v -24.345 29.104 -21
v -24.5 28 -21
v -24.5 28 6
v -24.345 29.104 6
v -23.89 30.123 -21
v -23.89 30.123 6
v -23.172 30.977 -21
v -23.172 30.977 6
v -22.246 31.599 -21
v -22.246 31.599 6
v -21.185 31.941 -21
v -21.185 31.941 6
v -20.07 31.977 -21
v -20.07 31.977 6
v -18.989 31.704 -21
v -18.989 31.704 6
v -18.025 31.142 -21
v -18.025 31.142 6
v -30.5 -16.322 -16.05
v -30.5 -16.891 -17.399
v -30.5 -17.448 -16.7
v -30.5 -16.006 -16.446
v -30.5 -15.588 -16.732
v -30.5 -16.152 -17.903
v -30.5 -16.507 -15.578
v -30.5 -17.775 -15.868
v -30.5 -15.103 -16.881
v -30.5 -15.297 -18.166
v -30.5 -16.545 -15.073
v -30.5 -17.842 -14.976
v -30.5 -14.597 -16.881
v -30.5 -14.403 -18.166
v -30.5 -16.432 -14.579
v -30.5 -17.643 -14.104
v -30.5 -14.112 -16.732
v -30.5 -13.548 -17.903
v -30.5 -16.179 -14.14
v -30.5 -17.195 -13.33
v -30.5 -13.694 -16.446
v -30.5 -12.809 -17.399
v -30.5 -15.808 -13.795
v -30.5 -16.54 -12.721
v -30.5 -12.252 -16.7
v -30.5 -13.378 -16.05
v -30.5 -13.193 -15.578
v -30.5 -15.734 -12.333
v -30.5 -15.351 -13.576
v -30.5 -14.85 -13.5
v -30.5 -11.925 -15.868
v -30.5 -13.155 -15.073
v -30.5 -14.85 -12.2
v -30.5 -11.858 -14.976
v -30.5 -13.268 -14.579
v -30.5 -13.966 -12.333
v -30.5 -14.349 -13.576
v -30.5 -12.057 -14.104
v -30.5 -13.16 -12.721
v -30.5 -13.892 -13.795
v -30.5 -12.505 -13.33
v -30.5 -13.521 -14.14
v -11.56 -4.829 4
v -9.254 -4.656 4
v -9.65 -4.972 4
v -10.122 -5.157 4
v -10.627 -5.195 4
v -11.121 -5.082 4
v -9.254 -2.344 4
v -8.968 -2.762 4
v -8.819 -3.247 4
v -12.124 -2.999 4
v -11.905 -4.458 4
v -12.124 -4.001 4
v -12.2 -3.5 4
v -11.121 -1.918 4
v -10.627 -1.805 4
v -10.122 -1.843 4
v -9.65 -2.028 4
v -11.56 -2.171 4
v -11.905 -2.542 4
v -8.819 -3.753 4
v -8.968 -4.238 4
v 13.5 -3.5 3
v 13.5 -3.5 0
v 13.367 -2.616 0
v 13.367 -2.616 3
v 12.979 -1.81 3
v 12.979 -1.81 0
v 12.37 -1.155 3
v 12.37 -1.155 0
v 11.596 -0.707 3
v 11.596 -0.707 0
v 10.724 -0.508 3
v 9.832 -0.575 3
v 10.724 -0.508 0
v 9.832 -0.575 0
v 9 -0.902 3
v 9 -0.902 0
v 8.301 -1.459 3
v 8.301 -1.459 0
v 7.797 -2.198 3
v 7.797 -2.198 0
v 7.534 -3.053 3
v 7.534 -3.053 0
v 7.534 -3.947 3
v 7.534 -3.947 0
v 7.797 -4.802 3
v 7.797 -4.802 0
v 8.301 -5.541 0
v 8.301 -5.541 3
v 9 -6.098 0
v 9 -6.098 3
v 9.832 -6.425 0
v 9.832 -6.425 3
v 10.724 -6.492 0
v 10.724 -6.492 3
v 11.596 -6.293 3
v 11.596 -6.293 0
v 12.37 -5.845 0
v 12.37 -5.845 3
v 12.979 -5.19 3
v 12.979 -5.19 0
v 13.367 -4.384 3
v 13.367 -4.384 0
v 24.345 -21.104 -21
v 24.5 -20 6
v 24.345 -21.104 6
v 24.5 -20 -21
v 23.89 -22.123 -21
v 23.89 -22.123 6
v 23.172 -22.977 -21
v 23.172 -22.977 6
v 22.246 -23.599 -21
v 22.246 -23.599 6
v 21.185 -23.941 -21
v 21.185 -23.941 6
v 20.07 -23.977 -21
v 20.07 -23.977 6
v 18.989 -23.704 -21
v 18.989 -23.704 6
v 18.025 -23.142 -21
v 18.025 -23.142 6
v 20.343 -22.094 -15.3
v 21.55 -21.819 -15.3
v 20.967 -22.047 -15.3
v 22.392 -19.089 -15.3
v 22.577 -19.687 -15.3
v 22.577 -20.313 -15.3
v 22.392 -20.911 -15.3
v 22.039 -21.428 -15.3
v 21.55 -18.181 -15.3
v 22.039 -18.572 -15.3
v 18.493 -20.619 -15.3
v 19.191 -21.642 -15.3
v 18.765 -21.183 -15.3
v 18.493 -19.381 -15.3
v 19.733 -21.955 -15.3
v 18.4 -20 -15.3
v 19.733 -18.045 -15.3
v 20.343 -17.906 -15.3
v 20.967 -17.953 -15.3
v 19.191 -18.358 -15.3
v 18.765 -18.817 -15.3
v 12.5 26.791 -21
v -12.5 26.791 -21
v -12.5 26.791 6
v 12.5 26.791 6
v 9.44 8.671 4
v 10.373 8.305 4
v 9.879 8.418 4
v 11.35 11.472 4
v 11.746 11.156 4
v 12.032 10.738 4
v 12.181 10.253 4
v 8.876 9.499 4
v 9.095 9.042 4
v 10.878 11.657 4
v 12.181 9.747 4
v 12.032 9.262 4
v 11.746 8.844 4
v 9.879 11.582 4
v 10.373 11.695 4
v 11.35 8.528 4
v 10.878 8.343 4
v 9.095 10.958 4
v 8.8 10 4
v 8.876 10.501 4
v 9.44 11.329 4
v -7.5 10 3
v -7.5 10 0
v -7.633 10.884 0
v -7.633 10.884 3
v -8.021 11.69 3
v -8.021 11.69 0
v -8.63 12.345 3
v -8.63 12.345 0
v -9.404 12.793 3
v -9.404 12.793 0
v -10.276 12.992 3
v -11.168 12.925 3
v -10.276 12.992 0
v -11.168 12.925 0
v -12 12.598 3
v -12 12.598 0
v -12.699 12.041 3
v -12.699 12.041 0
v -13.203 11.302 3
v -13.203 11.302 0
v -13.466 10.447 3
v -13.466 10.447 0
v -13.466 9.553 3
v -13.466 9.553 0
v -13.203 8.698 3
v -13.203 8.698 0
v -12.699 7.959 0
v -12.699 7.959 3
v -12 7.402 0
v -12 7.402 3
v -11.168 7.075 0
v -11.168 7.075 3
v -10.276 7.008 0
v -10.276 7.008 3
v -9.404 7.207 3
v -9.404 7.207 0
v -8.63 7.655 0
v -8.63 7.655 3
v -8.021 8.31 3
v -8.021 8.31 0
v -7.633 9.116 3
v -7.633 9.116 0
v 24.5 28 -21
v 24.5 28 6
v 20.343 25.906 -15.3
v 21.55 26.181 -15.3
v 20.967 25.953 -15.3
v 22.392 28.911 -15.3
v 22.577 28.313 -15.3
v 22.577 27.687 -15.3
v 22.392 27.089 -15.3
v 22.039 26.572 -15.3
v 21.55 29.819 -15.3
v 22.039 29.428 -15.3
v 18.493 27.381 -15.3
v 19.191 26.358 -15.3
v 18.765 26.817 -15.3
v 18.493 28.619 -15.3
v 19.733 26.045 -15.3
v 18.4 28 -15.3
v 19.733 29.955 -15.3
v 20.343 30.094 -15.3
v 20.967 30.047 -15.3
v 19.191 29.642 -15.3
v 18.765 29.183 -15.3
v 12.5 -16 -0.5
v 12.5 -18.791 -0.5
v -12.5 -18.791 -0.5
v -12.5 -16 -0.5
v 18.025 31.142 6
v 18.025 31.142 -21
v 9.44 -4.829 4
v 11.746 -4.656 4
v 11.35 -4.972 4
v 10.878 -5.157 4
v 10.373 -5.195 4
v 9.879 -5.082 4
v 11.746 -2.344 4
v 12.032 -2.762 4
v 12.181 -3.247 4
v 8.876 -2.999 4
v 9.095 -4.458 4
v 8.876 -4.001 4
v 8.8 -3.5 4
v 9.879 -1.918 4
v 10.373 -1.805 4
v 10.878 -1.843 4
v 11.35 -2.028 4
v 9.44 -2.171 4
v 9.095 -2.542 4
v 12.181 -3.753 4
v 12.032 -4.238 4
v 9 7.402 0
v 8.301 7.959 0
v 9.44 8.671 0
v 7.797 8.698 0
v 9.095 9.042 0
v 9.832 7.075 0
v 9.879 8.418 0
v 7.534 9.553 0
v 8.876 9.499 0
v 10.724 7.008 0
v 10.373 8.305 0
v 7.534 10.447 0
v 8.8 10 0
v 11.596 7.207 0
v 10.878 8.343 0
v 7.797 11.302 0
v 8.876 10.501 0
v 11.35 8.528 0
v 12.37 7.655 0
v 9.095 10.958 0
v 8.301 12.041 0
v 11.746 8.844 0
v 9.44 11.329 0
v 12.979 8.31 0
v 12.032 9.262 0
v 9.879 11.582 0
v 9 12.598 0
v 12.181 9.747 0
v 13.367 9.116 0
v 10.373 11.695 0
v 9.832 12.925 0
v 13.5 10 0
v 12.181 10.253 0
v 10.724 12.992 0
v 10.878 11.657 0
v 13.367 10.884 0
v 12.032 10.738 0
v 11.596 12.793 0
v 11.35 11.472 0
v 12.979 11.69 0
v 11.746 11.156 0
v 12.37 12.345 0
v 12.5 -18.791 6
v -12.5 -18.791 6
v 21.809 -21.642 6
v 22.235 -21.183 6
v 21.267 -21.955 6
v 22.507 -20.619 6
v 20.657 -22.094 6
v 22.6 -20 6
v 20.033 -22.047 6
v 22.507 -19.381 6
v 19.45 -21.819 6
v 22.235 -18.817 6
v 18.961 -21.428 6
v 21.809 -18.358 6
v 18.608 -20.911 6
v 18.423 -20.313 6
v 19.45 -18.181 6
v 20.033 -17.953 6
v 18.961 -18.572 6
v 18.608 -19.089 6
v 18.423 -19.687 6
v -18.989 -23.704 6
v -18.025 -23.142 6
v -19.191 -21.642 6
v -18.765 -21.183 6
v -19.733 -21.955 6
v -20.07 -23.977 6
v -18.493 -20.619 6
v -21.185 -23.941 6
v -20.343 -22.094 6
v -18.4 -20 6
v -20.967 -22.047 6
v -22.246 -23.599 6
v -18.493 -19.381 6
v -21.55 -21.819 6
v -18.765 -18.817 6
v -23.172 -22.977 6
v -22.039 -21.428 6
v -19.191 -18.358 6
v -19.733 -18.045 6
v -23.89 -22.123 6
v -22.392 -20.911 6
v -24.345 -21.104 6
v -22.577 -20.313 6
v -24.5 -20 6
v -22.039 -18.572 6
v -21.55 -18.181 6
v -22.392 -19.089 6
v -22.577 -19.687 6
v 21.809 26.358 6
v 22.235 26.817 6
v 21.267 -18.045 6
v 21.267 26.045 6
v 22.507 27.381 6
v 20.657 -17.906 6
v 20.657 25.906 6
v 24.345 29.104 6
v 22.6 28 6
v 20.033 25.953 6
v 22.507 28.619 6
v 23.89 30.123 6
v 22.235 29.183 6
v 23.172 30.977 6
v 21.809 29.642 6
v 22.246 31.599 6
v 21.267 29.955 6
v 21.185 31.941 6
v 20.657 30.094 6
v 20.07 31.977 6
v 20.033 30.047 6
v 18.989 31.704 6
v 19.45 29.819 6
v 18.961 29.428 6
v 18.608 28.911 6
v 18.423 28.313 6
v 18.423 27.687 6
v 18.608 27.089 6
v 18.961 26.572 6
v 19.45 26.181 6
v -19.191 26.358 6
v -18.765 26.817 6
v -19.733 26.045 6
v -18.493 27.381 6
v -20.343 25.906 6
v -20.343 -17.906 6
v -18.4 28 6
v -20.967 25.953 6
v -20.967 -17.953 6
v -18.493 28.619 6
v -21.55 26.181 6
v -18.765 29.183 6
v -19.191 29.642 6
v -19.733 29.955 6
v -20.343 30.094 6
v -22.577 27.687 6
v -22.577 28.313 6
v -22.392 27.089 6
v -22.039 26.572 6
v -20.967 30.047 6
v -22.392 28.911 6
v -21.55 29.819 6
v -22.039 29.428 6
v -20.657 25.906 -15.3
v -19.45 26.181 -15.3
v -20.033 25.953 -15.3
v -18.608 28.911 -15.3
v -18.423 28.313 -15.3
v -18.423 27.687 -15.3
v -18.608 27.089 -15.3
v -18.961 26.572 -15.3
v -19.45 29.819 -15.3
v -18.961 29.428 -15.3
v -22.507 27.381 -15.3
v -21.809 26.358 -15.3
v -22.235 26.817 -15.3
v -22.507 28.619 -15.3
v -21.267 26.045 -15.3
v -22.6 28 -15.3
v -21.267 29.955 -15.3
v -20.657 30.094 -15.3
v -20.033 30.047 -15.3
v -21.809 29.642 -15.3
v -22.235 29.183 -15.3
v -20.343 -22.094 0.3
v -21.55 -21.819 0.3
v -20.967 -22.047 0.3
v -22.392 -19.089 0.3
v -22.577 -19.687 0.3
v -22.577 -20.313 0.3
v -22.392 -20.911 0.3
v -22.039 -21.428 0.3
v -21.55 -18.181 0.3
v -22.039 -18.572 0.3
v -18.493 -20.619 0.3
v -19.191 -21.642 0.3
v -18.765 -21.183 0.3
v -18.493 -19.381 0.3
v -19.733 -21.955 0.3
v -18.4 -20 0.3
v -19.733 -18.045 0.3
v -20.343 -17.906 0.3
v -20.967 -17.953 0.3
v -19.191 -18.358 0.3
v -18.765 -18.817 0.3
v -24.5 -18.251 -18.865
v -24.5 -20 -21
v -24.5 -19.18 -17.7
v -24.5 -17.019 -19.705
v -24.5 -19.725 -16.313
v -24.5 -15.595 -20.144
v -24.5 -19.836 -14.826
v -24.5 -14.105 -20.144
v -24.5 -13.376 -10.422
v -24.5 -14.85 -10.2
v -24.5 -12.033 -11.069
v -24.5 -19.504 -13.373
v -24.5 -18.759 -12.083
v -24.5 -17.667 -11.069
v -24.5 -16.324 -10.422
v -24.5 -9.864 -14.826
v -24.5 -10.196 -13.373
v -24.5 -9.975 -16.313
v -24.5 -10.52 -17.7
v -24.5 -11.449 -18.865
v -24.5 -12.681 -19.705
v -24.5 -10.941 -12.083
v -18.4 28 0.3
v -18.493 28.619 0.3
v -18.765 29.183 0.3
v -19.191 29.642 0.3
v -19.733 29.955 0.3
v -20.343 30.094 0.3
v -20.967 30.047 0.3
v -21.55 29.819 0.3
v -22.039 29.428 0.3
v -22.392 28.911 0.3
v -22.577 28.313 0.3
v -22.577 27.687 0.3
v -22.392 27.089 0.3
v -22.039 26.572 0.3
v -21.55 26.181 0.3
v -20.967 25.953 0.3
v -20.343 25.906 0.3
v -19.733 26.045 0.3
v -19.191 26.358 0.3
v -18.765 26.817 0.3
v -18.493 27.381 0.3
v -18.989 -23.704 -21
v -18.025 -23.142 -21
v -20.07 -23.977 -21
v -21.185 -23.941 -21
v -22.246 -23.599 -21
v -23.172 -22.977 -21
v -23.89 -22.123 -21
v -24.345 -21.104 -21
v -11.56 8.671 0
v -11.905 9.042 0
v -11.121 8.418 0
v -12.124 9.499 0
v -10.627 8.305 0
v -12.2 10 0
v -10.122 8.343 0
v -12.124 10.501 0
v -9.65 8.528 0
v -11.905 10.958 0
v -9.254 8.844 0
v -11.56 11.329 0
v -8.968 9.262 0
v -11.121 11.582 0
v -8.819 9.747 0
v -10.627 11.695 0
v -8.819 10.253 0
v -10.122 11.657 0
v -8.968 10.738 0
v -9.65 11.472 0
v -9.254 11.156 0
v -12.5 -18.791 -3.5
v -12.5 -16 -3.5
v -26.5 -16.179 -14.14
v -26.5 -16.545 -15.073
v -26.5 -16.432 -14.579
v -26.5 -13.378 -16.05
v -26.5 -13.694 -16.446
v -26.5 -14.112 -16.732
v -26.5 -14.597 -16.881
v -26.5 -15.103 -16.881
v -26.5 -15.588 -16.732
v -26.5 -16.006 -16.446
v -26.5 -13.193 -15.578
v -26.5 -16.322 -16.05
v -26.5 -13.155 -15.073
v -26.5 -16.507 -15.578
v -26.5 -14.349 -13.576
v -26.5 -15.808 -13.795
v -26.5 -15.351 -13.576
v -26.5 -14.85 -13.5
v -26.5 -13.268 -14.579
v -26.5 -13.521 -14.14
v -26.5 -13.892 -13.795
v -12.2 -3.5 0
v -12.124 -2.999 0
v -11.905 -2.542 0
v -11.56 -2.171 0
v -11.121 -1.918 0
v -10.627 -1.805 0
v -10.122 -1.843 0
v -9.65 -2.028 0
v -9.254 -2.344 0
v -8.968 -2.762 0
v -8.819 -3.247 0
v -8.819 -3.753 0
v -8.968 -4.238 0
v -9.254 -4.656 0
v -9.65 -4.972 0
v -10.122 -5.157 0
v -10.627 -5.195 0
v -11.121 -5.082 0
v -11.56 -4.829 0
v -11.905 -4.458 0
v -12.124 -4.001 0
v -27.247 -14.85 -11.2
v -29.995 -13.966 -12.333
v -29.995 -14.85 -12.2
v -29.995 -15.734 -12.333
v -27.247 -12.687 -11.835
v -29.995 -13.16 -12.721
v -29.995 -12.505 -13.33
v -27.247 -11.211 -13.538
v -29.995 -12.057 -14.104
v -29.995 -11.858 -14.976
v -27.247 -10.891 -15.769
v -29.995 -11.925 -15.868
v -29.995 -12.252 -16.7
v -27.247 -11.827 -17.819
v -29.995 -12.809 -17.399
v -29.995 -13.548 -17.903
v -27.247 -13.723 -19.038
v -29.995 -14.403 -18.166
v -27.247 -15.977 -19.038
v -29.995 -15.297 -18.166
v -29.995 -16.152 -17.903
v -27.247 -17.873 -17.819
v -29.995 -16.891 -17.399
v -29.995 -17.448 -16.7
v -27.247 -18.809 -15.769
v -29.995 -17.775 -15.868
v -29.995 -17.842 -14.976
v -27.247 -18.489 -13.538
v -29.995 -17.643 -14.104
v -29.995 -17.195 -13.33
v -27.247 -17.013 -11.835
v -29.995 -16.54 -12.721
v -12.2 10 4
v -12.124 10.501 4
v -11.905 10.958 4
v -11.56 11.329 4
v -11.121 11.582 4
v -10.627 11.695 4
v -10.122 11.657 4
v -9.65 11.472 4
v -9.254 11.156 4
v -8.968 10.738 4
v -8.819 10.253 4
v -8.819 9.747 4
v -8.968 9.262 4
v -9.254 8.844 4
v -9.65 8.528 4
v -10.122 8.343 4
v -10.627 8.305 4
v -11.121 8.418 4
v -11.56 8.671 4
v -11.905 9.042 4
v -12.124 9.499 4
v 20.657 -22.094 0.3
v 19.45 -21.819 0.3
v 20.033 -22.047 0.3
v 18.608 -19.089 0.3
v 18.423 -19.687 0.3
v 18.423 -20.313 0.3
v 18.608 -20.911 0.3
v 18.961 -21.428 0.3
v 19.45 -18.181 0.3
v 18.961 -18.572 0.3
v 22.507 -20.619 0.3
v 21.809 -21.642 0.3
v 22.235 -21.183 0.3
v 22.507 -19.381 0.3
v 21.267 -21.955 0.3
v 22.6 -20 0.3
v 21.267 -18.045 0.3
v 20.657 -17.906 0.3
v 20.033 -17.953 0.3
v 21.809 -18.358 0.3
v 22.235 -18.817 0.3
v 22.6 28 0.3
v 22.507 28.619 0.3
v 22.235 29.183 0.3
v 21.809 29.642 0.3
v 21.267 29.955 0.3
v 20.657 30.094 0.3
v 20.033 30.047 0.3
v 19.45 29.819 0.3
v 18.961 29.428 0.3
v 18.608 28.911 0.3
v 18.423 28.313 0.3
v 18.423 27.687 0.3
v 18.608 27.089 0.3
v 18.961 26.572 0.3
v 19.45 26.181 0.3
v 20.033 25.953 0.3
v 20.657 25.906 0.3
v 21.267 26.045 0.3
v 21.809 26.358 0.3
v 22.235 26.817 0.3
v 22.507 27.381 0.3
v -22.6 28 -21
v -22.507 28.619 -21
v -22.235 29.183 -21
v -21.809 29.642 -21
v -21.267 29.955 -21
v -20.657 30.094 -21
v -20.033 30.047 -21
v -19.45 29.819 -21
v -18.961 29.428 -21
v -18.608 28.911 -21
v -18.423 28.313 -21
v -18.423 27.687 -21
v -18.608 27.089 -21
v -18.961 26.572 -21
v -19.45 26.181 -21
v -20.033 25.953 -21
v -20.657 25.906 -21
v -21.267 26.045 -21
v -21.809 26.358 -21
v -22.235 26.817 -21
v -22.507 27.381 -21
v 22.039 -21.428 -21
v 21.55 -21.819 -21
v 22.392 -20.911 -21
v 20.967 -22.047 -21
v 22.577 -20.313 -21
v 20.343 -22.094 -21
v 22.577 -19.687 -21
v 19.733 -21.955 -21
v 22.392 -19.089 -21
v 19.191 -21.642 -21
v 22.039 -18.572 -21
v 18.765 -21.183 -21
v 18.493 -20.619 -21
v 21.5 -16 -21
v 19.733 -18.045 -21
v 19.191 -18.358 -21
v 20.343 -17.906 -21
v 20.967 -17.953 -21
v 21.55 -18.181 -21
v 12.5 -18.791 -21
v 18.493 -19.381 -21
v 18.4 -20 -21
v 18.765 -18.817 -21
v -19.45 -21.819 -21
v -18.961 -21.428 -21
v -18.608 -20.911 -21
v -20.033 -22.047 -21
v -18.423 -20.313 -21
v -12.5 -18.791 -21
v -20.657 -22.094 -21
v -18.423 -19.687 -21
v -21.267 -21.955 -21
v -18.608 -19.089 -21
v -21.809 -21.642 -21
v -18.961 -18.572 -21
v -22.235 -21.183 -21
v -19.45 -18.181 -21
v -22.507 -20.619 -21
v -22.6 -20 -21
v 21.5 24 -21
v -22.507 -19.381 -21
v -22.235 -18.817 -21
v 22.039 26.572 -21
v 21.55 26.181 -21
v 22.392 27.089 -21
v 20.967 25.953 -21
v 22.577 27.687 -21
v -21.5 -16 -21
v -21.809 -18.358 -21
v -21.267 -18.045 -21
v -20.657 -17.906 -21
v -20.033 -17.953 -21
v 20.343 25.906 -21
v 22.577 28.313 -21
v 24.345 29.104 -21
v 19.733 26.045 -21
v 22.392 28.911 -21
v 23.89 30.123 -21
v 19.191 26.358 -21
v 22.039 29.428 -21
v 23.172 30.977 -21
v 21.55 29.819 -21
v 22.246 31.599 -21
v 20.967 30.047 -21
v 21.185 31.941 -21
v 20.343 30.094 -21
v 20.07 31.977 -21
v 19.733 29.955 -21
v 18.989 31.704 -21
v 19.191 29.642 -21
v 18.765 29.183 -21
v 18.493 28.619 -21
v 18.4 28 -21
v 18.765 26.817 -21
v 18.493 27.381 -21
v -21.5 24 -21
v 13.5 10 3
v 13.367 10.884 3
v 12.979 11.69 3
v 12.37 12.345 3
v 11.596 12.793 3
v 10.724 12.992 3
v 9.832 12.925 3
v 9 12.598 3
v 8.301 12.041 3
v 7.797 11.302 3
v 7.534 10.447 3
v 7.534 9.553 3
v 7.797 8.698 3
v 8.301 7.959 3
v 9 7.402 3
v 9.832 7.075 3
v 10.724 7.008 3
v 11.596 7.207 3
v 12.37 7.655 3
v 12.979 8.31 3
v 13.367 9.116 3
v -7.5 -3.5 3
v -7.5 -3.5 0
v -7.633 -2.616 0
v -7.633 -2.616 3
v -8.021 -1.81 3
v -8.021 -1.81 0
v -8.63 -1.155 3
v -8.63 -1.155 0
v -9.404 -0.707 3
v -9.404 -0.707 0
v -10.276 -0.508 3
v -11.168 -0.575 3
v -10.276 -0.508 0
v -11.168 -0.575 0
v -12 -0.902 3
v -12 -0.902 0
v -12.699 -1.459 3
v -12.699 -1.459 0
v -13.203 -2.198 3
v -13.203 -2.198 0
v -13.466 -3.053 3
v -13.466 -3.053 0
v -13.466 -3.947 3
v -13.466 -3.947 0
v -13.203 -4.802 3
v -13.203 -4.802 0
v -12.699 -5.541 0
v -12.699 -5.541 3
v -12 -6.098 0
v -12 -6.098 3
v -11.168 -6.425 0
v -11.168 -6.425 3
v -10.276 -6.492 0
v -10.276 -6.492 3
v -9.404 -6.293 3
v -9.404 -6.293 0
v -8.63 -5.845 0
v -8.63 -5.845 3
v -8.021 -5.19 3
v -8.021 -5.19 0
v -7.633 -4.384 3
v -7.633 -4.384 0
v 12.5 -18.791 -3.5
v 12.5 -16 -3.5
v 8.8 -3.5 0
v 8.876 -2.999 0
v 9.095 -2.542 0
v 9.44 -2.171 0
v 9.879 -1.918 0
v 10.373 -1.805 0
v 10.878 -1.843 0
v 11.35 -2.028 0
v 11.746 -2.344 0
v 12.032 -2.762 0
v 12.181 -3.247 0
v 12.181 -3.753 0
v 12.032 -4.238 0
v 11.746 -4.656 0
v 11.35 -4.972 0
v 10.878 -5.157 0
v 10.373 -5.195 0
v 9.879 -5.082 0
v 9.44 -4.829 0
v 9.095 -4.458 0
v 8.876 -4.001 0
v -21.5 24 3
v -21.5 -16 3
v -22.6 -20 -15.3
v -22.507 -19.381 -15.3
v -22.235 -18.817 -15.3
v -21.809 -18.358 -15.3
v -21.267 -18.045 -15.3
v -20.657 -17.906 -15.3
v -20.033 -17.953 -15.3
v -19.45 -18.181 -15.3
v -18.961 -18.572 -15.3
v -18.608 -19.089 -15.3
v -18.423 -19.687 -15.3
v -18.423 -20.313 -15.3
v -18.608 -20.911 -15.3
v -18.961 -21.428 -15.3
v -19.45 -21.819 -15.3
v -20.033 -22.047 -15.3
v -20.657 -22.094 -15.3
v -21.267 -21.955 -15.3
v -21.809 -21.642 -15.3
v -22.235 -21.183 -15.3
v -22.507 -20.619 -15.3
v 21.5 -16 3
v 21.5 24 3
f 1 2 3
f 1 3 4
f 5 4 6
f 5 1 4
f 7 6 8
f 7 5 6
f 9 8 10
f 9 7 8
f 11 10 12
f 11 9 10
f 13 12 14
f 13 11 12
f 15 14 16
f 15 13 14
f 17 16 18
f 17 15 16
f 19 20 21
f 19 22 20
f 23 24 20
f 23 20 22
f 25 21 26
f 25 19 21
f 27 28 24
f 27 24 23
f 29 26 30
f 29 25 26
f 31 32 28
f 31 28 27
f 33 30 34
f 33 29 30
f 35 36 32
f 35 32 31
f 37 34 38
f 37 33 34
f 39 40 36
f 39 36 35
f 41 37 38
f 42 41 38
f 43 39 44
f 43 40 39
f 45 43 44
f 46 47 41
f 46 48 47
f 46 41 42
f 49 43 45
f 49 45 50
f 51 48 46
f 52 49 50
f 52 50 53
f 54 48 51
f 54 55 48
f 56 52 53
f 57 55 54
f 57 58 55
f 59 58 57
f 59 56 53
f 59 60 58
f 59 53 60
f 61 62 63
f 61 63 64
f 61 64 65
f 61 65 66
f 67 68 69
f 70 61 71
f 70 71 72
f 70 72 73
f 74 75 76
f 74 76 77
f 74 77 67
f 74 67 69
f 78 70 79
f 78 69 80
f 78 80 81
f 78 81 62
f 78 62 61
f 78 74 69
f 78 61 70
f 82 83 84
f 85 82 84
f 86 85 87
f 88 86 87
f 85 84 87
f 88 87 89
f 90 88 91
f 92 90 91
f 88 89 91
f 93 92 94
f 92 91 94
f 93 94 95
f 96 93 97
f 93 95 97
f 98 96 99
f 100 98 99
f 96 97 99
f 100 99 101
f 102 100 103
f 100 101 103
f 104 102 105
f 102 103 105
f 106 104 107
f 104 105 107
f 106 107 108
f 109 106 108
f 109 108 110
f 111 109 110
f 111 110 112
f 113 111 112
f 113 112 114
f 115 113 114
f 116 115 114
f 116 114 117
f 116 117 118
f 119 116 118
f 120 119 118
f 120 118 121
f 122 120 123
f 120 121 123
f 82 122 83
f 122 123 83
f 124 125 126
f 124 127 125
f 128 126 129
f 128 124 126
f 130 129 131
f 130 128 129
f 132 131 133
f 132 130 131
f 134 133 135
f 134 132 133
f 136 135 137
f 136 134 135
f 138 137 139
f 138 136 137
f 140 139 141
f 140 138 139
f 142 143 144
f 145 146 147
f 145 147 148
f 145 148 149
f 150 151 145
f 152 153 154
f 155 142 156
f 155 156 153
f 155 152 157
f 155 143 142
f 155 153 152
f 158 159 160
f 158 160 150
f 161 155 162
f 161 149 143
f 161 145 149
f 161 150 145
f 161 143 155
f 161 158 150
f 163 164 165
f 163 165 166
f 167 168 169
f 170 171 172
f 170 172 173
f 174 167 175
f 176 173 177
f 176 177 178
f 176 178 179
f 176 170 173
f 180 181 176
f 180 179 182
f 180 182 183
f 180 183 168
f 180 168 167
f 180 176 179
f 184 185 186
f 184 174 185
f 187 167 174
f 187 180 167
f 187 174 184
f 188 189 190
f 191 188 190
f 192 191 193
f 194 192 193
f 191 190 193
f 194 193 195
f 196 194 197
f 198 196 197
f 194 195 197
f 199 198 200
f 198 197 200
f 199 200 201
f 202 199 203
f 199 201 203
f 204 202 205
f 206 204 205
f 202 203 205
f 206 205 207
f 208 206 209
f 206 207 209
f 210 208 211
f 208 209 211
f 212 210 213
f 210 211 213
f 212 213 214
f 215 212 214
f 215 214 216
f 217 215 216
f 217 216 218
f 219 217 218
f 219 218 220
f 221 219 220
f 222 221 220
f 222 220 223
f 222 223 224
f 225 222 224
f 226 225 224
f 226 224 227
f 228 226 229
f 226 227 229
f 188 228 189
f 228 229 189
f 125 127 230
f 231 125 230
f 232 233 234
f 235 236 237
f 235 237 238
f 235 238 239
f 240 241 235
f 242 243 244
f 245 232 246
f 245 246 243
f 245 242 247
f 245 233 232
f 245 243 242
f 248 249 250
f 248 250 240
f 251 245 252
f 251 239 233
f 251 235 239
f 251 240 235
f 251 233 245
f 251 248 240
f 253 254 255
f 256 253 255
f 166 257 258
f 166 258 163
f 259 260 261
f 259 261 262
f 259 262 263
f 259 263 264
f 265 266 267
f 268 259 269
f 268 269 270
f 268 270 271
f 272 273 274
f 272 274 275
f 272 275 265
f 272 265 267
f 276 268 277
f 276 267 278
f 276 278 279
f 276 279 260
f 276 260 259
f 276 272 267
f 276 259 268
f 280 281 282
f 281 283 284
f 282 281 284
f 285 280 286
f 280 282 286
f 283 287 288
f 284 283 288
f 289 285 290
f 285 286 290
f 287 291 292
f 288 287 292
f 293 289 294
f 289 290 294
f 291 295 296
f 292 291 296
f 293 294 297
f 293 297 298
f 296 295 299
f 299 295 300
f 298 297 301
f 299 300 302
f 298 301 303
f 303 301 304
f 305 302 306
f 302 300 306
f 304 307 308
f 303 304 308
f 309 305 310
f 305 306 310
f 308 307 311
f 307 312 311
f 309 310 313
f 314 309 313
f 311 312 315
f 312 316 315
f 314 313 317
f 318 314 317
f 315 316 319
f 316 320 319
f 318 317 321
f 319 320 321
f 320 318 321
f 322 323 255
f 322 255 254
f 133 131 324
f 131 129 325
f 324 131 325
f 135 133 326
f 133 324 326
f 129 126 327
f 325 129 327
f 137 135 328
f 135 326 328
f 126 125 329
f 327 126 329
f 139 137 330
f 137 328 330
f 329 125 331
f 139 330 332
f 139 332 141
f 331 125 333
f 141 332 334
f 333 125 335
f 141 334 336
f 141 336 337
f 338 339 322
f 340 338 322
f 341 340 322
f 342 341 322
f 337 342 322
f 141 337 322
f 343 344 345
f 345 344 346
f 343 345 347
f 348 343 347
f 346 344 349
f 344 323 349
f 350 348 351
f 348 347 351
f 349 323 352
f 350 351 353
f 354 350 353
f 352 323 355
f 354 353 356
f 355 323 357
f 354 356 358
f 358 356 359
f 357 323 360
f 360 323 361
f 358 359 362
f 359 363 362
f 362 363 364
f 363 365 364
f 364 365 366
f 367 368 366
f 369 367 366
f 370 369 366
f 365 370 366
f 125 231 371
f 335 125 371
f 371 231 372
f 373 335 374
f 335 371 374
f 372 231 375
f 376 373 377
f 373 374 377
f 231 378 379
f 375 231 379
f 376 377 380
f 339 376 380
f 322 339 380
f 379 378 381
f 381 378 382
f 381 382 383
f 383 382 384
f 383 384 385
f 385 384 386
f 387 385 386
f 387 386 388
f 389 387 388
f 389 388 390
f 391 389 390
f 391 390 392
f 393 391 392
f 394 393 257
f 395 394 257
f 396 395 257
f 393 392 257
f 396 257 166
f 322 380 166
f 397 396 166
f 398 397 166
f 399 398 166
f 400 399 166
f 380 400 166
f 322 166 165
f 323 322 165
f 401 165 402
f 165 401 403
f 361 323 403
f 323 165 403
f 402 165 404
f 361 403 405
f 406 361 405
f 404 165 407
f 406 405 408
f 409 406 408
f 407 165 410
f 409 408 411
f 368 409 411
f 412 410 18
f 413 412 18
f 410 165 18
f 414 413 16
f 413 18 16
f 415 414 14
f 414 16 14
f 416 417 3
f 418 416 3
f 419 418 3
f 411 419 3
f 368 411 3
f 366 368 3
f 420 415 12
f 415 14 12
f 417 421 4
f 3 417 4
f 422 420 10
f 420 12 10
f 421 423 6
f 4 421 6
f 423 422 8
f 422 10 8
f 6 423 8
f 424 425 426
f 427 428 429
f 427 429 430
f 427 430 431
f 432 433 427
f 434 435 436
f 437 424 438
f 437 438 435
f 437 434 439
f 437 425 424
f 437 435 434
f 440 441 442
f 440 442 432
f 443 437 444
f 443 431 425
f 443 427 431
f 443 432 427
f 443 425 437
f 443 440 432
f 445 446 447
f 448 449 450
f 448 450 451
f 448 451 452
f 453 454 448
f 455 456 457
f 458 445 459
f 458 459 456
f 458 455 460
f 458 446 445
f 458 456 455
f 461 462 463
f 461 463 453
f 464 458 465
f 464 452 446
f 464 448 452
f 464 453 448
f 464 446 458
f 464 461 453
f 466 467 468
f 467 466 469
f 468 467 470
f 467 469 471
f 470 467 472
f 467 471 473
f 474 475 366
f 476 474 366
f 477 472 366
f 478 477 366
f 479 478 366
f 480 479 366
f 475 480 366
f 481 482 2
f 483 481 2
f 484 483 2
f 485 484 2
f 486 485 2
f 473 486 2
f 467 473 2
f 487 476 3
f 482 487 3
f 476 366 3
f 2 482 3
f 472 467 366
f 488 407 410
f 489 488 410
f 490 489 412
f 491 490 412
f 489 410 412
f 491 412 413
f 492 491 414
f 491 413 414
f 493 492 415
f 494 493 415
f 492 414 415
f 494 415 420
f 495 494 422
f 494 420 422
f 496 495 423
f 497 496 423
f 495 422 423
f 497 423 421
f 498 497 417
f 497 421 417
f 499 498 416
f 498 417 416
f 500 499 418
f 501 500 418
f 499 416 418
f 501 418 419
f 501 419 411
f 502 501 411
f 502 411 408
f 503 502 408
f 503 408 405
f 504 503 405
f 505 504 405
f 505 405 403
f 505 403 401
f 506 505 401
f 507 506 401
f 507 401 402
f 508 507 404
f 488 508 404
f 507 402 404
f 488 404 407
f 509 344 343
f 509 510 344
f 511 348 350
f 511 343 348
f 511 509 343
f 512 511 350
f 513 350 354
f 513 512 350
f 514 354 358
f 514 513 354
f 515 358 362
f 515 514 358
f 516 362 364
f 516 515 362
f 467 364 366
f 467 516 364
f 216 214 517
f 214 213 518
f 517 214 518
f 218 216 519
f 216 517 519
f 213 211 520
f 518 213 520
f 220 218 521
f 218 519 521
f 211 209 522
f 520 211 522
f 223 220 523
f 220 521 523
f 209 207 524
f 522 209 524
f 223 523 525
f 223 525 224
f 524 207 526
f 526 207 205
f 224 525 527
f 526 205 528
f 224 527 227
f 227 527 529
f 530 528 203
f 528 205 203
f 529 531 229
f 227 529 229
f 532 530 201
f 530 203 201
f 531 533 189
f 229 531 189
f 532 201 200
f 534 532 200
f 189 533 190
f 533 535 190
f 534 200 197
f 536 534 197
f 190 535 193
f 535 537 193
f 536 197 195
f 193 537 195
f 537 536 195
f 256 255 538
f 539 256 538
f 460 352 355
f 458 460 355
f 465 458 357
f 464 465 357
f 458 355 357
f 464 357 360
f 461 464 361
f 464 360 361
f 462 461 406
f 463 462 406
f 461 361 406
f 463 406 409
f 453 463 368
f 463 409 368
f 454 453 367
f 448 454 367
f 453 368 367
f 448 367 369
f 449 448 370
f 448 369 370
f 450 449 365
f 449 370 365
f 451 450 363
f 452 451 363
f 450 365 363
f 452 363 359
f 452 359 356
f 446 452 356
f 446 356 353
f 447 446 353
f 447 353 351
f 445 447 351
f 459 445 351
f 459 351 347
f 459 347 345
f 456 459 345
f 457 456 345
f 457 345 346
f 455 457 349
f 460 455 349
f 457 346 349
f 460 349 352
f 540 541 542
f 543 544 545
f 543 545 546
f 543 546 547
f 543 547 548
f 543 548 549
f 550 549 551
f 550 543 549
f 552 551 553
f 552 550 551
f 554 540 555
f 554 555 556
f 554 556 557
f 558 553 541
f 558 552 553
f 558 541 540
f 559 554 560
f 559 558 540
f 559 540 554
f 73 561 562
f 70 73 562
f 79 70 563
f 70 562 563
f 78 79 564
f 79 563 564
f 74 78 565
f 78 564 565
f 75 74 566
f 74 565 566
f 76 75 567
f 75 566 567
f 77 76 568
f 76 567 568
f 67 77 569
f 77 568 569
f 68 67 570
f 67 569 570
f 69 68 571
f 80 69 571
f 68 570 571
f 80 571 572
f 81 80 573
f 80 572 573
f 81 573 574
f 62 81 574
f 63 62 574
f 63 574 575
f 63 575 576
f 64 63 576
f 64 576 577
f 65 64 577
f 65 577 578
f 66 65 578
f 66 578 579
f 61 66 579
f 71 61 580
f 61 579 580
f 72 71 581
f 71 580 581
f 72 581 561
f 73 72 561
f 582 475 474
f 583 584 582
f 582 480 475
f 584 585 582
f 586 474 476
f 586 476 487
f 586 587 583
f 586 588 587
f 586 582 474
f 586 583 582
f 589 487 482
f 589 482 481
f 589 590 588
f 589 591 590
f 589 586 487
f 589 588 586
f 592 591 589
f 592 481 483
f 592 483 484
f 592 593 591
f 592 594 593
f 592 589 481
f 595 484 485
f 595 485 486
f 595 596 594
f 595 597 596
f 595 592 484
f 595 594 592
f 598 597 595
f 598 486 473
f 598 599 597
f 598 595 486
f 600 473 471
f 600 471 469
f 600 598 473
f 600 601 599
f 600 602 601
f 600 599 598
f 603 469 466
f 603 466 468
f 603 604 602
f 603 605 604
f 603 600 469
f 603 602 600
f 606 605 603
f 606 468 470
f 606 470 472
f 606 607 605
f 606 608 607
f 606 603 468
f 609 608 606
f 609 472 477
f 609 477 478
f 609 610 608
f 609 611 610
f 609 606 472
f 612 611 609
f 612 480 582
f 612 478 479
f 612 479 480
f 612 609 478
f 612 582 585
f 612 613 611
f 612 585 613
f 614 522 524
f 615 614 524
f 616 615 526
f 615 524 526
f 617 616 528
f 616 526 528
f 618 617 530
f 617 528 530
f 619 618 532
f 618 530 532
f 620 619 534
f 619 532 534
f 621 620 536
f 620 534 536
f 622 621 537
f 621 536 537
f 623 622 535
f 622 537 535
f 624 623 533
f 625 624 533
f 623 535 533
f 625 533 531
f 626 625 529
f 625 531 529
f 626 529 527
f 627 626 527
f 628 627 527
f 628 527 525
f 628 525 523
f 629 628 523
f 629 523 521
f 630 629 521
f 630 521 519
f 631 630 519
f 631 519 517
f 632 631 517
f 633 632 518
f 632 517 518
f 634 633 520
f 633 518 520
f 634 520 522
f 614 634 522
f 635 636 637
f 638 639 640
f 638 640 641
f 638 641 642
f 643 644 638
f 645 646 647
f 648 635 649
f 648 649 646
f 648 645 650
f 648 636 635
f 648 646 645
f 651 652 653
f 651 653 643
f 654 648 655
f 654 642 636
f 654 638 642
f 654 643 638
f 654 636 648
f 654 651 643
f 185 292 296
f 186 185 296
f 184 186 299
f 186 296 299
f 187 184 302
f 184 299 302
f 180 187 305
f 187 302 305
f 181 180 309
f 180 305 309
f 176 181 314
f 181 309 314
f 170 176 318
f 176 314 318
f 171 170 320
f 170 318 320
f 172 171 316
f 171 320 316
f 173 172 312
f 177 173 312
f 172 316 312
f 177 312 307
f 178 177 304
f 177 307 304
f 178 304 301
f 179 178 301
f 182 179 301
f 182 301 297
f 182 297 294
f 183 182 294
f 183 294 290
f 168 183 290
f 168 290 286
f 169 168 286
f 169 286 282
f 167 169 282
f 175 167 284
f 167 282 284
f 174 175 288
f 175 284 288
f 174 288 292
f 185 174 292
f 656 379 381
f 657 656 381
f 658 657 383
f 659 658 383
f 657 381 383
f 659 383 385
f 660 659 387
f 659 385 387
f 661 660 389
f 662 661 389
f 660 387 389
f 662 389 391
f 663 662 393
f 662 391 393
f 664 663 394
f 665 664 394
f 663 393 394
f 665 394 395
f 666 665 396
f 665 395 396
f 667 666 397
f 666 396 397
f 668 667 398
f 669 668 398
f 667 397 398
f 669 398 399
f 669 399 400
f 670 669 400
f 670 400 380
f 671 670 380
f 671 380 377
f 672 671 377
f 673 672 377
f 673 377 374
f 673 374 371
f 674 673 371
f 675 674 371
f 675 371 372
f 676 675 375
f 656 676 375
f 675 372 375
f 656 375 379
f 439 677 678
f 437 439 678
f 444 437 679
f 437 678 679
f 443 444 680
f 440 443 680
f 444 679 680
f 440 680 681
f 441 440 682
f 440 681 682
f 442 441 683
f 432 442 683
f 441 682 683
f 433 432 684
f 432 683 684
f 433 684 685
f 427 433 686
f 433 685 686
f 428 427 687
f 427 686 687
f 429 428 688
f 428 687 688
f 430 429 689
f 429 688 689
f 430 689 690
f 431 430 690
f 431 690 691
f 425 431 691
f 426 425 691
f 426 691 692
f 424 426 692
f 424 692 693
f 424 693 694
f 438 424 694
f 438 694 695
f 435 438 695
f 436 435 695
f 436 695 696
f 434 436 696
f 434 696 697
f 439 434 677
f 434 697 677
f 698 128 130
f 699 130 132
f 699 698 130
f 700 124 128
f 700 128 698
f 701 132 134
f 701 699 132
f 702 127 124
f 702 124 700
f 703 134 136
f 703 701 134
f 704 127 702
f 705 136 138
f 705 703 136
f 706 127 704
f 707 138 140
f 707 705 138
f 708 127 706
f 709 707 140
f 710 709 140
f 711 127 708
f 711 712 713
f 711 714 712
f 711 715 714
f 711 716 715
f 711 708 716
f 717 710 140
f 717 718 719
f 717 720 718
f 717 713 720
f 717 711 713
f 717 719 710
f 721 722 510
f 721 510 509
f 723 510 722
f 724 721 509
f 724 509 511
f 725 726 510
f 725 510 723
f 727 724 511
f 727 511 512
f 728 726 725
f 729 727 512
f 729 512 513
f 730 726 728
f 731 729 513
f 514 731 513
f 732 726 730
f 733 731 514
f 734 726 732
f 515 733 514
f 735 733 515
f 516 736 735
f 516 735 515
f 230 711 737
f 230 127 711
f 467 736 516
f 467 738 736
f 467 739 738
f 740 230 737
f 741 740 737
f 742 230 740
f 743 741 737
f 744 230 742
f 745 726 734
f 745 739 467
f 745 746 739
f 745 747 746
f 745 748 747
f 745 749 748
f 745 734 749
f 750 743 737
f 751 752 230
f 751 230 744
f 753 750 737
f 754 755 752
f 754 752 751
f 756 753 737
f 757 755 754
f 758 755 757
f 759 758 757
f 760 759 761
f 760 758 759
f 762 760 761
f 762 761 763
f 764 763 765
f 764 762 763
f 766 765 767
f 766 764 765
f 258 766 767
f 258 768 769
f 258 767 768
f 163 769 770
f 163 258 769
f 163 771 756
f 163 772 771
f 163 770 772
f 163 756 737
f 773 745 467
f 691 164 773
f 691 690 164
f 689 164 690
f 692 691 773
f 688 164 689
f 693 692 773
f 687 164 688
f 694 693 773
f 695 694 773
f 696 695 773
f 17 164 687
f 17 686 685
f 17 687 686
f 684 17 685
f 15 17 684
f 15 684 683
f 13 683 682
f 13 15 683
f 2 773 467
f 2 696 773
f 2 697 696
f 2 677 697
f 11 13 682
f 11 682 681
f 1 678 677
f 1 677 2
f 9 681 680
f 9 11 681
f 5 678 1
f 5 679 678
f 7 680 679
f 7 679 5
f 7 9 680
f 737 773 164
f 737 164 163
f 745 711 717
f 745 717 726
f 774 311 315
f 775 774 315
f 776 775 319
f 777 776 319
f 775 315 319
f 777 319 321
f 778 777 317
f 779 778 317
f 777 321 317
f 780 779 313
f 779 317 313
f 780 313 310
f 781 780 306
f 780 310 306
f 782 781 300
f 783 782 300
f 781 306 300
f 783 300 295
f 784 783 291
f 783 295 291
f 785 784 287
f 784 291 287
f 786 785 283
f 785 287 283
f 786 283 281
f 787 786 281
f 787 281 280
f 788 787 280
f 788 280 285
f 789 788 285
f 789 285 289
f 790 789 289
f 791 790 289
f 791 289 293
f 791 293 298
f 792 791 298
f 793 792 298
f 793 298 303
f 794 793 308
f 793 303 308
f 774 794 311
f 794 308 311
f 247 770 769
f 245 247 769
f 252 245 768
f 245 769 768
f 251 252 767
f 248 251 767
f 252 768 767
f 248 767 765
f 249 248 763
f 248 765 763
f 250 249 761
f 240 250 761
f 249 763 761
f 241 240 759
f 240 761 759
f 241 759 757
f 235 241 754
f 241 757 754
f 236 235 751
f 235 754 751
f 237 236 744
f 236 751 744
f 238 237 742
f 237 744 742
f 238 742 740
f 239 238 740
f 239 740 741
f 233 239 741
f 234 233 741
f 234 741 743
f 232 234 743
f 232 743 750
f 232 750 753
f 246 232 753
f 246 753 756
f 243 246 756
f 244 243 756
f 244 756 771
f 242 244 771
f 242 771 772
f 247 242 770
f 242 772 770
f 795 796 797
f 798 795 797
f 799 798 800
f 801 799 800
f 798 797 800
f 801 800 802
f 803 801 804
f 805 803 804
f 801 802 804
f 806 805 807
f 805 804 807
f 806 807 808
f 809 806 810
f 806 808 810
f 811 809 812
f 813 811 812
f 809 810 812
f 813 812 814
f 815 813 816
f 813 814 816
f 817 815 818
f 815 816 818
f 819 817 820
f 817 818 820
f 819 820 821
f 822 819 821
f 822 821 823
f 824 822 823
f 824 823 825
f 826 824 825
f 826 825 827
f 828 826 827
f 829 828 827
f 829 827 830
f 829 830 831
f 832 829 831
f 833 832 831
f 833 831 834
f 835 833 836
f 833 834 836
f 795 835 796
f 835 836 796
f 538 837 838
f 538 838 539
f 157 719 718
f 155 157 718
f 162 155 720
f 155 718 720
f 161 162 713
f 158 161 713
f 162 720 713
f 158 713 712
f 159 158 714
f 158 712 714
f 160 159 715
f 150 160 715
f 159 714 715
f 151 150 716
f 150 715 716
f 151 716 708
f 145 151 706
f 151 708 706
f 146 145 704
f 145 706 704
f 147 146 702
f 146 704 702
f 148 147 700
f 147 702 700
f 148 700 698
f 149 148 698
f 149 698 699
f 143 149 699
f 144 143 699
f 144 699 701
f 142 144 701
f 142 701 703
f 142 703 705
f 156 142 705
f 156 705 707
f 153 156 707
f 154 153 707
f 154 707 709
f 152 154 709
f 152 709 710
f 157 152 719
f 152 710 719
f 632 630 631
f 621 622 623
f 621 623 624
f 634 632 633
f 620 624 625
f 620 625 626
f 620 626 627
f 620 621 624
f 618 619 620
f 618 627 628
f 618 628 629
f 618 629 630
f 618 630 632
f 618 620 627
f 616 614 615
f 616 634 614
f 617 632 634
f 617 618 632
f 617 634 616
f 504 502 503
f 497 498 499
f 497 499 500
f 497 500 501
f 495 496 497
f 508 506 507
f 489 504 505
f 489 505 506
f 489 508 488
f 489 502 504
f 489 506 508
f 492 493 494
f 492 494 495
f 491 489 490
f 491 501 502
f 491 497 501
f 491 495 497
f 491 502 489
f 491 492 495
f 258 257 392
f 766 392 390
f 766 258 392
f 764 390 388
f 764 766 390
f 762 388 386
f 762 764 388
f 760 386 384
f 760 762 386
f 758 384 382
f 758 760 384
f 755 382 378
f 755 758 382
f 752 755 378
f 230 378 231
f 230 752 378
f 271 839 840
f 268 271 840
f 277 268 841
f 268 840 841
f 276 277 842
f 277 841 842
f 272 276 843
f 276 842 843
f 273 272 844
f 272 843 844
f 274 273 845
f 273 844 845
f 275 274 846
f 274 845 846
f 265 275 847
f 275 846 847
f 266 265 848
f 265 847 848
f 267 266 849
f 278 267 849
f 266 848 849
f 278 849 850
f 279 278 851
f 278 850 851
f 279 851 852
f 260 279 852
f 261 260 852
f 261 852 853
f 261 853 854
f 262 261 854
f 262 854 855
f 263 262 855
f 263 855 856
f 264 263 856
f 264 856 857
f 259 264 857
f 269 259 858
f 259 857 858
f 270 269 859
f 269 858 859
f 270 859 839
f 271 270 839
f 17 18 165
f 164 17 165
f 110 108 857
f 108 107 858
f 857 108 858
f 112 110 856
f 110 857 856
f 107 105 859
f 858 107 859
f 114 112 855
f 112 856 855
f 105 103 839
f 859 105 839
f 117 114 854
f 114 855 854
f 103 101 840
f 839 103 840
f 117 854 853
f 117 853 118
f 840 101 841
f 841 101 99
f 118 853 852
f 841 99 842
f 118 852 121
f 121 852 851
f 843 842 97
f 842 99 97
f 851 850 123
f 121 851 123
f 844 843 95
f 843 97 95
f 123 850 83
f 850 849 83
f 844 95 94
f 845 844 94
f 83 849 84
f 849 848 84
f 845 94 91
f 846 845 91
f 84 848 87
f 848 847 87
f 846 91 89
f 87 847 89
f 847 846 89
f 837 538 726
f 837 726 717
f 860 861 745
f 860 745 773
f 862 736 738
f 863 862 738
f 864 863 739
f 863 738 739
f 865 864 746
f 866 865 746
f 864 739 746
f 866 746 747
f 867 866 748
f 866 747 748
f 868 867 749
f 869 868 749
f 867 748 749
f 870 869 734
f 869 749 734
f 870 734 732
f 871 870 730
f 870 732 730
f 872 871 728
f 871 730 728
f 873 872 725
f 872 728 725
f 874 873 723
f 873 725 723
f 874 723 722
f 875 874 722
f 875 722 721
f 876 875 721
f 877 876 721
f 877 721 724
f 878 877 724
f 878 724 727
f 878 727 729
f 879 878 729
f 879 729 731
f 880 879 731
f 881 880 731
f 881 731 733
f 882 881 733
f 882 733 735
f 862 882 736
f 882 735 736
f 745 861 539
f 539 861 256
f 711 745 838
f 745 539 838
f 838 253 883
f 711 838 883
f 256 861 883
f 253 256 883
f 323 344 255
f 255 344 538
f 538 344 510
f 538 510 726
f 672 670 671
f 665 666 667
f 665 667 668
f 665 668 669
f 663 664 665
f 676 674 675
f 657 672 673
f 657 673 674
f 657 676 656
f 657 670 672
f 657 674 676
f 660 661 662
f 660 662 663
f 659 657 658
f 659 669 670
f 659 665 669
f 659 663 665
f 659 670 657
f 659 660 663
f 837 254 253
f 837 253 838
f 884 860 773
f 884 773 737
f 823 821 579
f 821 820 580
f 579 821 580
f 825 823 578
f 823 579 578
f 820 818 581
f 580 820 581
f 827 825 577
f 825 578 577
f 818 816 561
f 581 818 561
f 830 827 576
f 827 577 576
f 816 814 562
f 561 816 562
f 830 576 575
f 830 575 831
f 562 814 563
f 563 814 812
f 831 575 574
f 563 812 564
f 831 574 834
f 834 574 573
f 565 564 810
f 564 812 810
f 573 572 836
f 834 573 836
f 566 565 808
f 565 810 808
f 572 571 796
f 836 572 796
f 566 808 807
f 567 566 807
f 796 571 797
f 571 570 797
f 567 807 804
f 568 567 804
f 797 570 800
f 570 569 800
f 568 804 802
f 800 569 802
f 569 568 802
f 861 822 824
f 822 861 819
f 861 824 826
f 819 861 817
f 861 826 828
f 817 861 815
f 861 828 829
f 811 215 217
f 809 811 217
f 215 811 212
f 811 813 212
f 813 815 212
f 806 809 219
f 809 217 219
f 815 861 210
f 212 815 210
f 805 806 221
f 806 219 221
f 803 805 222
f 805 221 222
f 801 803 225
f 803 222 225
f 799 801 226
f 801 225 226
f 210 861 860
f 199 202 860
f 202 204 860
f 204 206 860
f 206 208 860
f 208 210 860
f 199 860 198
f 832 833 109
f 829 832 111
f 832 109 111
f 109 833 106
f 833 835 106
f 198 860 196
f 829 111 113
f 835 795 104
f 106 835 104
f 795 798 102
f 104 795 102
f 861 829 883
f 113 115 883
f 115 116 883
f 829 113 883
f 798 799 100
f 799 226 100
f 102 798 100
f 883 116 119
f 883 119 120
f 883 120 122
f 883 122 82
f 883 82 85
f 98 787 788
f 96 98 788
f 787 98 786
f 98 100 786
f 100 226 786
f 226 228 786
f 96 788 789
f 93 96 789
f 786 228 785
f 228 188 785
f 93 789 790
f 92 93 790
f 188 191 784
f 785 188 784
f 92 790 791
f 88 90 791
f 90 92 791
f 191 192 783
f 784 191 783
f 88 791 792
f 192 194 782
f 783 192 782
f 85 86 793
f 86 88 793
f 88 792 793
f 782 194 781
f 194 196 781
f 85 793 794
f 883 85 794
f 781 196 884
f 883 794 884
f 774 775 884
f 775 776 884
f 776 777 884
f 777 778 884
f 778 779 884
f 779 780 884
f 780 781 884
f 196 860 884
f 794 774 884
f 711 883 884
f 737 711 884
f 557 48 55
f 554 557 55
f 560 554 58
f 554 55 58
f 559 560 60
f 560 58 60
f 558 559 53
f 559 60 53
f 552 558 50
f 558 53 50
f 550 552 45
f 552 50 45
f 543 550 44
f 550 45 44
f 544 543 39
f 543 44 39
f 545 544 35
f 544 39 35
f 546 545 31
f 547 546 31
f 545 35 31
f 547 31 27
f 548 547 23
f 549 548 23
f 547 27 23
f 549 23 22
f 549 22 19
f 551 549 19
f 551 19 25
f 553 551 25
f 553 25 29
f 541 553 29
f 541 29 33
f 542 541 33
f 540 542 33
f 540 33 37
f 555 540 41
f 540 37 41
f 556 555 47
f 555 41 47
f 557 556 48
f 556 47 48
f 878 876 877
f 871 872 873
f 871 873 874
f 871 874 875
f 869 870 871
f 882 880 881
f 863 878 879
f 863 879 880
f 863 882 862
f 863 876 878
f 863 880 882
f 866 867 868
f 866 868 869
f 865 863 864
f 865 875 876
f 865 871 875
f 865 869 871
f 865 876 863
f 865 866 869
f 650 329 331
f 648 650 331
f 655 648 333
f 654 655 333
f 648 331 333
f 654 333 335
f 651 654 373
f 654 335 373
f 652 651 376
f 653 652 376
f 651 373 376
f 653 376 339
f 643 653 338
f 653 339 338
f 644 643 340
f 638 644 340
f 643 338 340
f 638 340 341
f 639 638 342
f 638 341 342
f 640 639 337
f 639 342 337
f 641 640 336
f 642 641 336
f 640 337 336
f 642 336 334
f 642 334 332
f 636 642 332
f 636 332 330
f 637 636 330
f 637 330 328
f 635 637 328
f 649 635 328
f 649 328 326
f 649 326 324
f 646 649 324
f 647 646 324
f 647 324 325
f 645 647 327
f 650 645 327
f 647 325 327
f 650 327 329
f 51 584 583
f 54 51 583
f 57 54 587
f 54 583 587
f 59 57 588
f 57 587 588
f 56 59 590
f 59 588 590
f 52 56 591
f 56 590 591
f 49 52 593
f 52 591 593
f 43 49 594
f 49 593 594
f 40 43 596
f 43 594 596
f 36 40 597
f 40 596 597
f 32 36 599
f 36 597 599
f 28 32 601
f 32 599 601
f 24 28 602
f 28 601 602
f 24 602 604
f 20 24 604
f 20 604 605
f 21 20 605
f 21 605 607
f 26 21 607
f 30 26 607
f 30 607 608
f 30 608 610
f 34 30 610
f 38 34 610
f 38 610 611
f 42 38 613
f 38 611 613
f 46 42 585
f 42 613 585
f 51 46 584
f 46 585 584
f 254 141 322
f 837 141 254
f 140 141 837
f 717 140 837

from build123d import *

# Parameters (mm, degrees)
SKIZZE1_R                        = 3
AUFSATZ_KAMERA_HALTERUNG_DEPTH   = 3
AUFSATZ_KAMERA_HALTERUNG_2_DEPTH = 3
AUFSATZ_KAMERA_HALTERUNG_3_DEPTH = 3
AUFSATZ_KAMERA_HALTERUNG_4_DEPTH = 3
SKIZZE2_W                        = 43
SKIZZE2_H                        = 40
DECKEL_DEPTH                     = 3
SKIZZE3_R                        = 1.7
L_CHER_KAMERA_HALTERUNG_DEPTH    = 4
SKIZZE4_W                        = 49
SKIZZE4_H                        = 45.581395348
SKIZZE4_W_2                      = 43
SKIZZE4_H_2                      = 40
AUFSATZ_LINEAR_AUSTRAGEN1_DEPTH  = 27
SKIZZE6_W                        = 25
SKIZZE6_H                        = 3
SCHNITT_LINEAR_AUSTRAGEN1_DEPTH  = 2.790698
SKIZZE7_R                        = 4
AUFSATZ_LINEAR_AUSTRAGEN2_DEPTH  = 27
SKIZZE8_R                        = 2.1
SCHNITT_LINEAR_AUSTRAGEN2_DEPTH  = 5.7
SKIZZE9_W                        = 0.18718111
SKIZZE9_H                        = 1.209302326
AUFSATZ_LINEAR_AUSTRAGEN3_DEPTH  = 27
SKIZZE10_R                       = 2.1
SCHNITT_LINEAR_AUSTRAGEN3_DEPTH  = 5.7
SKIZZE11_R                       = 3
AUFSATZ_LINEAR_AUSTRAGEN4_DEPTH  = 6
SKIZZE12_R                       = 1.7
SCHNITT_LINEAR_AUSTRAGEN4_DEPTH  = 4
FASE1_SIZE                       = 2
FASE1_SIZE2                      = 5.494954839


with BuildPart() as part:
    # Skizze1 → Aufsatz Kamera Halterung (new body)
    with BuildSketch(Plane.XY):
        with Locations((10.5, -3.5)):
            Circle(SKIZZE1_R)
    extrude(amount=AUFSATZ_KAMERA_HALTERUNG_DEPTH)



with BuildPart() as body_2:
    # Skizze1 → Aufsatz Kamera Halterung 2 (new body)
    with BuildSketch(Plane.XY):
        with Locations((10.5, 10)):
            Circle(SKIZZE1_R)
    extrude(amount=AUFSATZ_KAMERA_HALTERUNG_2_DEPTH)


with BuildPart() as body_3:
    # Skizze1 → Aufsatz Kamera Halterung 3 (new body)
    with BuildSketch(Plane.XY):
        with Locations((-10.5, 10)):
            Circle(SKIZZE1_R)
    extrude(amount=AUFSATZ_KAMERA_HALTERUNG_3_DEPTH)


with BuildPart() as body_4:
    # Skizze1 → Aufsatz Kamera Halterung 4 (new body)
    with BuildSketch(Plane.XY):
        with Locations((-10.5, -3.5)):
            Circle(SKIZZE1_R)
    extrude(amount=AUFSATZ_KAMERA_HALTERUNG_4_DEPTH)


with BuildPart() as part_1:
    add(part.part)

    add(body_2.part)  # Deckel merges body 2

    add(body_3.part)  # Deckel merges body 3

    add(body_4.part)  # Deckel merges body 4
    # Skizze2 → Deckel (add)
    with BuildSketch(Plane.XY.offset(3)):
        with Locations((0, 4)):
            Rectangle(SKIZZE2_W, SKIZZE2_H)
    extrude(amount=DECKEL_DEPTH)

    # Skizze3 → Löcher Kamera Halterung (cut)
    with BuildSketch(Plane(origin=(0, 0, 0), x_dir=(-1, 0, 0), z_dir=(0, 0, -1))):
        with Locations((10.5, 10)):
            Circle(SKIZZE3_R)
        with Locations((10.5, -3.5)):
            Circle(SKIZZE3_R)
        with Locations((-10.5, -3.5)):
            Circle(SKIZZE3_R)
        with Locations((-10.5, 10)):
            Circle(SKIZZE3_R)
    extrude(amount=-L_CHER_KAMERA_HALTERUNG_DEPTH, mode=Mode.SUBTRACT)

    # Skizze4 → Aufsatz-Linear austragen1 (add)
    with BuildSketch(Plane.XY.offset(6)):
        with Locations((0, 4)):
            Rectangle(SKIZZE4_W, SKIZZE4_H)
        with Locations((0, 4)):
            Rectangle(SKIZZE4_W_2, SKIZZE4_H_2, mode=Mode.SUBTRACT)
    extrude(amount=-AUFSATZ_LINEAR_AUSTRAGEN1_DEPTH)

    # Skizze6 → Schnitt-Linear austragen1 (cut)
    with BuildSketch(Plane(origin=(0, -18.790697674, 0), x_dir=(-1, 0, 0), z_dir=(0, -1, 0))):
        with Locations((0, 2)):
            Rectangle(SKIZZE6_W, SKIZZE6_H)
    extrude(amount=-SCHNITT_LINEAR_AUSTRAGEN1_DEPTH, mode=Mode.SUBTRACT)

    # Skizze7 → Aufsatz-Linear austragen2 (add, through all)
    with BuildSketch(Plane(origin=(0, 0, -21), x_dir=(-1, 0, 0), z_dir=(0, 0, -1))):
        with Locations((-20.5, 28)):
            Circle(SKIZZE7_R)
        with Locations((20.5, 28)):
            Circle(SKIZZE7_R)
        with Locations((20.5, -20)):
            Circle(SKIZZE7_R)
        with Locations((-20.5, -20)):
            Circle(SKIZZE7_R)
    extrude(amount=-AUFSATZ_LINEAR_AUSTRAGEN2_DEPTH)

    # Skizze8 → Schnitt-Linear austragen2 (cut)
    with BuildSketch(Plane(origin=(0, 0, -21), x_dir=(-1, 0, 0), z_dir=(0, 0, -1))):
        with Locations((-20.5, 28)):
            Circle(SKIZZE8_R)
        with Locations((20.5, 28)):
            Circle(SKIZZE8_R)
        with Locations((20.5, -20)):
            Circle(SKIZZE8_R)
        with Locations((-20.5, -20)):
            Circle(SKIZZE8_R)
    extrude(amount=-SCHNITT_LINEAR_AUSTRAGEN2_DEPTH, mode=Mode.SUBTRACT)

    # Skizze9 → Aufsatz-Linear austragen3 (add, through all)
    with BuildSketch(Plane(origin=(0, 0, -21), x_dir=(-1, 0, 0), z_dir=(0, 0, -1))):
        with Locations((-24.406409445, 27.395348837)):
            Rectangle(SKIZZE9_W, SKIZZE9_H)
        with Locations((24.406409445, 27.395348837)):
            Rectangle(SKIZZE9_W, SKIZZE9_H)
        with Locations((24.406409445, -19.395348837)):
            Rectangle(SKIZZE9_W, SKIZZE9_H)
        with Locations((-24.406409445, -19.395348837)):
            Rectangle(SKIZZE9_W, SKIZZE9_H)
        with BuildLine():
            Line((-18.024994038, 31.142347131), (-12.5, 26.790697674))
            Line((-12.5, 26.790697674), (-16.68718111, 26.790697674))
            ThreePointArc((-16.68718111, 26.790697674), (-16.676598558, 29.175415421), (-18.024994038, 31.142347131))
        make_face()
        with BuildLine():
            Line((12.5, 26.790697674), (16.68718111, 26.790697674))
            ThreePointArc((16.68718111, 26.790697674), (16.676598558, 29.175415421), (18.024994038, 31.142347131))
            Line((18.024994038, 31.142347131), (12.5, 26.790697674))
        make_face()
        with BuildLine():
            Line((18.024994038, -23.142347131), (12.5, -18.790697674))
            Line((12.5, -18.790697674), (16.68718111, -18.790697674))
            ThreePointArc((16.68718111, -18.790697674), (16.676598558, -21.175415421), (18.024994038, -23.142347131))
        make_face()
        with BuildLine():
            Line((-12.5, -18.790697674), (-16.68718111, -18.790697674))
            ThreePointArc((-16.68718111, -18.790697674), (-16.676598558, -21.175415421), (-18.024994038, -23.142347131))
            Line((-18.024994038, -23.142347131), (-12.5, -18.790697674))
        make_face()
    extrude(amount=-AUFSATZ_LINEAR_AUSTRAGEN3_DEPTH)

    # Skizze10 → Schnitt-Linear austragen3 (cut)
    with BuildSketch(Plane.XY.offset(6)):
        with Locations((-20.5, 28)):
            Circle(SKIZZE10_R)
        with Locations((20.5, 28)):
            Circle(SKIZZE10_R)
        with Locations((20.5, -20)):
            Circle(SKIZZE10_R)
        with Locations((-20.5, -20)):
            Circle(SKIZZE10_R)
    extrude(amount=-SCHNITT_LINEAR_AUSTRAGEN3_DEPTH, mode=Mode.SUBTRACT)

    # Skizze11 → Aufsatz-Linear austragen4 (add)
    with BuildSketch(Plane.ZY.offset(24.5)):
        with Locations((-15.2, -14.85)):
            Circle(SKIZZE11_R)
    extrude(amount=AUFSATZ_LINEAR_AUSTRAGEN4_DEPTH)

    # Skizze12 → Schnitt-Linear austragen4 (cut)
    with BuildSketch(Plane.ZY.offset(30.5)):
        with Locations((-15.2, -14.85)):
            Circle(SKIZZE12_R)
    extrude(amount=-SCHNITT_LINEAR_AUSTRAGEN4_DEPTH, mode=Mode.SUBTRACT)

    # Fase1
    fase1_edges = [part_1.edges().sort_by_distance(p)[0] for p in [
        (-24.5, -14.85, -18.2),
    ]]
    fase1_side = [part_1.faces().sort_by_distance(p)[0] for p in [
        (-24.5, 4.443247545, -7.318938669),
    ]]
    chamfer(fase1_edges, length=FASE1_SIZE, length2=FASE1_SIZE2, reference=fase1_side[0])


solid = part_1.part
